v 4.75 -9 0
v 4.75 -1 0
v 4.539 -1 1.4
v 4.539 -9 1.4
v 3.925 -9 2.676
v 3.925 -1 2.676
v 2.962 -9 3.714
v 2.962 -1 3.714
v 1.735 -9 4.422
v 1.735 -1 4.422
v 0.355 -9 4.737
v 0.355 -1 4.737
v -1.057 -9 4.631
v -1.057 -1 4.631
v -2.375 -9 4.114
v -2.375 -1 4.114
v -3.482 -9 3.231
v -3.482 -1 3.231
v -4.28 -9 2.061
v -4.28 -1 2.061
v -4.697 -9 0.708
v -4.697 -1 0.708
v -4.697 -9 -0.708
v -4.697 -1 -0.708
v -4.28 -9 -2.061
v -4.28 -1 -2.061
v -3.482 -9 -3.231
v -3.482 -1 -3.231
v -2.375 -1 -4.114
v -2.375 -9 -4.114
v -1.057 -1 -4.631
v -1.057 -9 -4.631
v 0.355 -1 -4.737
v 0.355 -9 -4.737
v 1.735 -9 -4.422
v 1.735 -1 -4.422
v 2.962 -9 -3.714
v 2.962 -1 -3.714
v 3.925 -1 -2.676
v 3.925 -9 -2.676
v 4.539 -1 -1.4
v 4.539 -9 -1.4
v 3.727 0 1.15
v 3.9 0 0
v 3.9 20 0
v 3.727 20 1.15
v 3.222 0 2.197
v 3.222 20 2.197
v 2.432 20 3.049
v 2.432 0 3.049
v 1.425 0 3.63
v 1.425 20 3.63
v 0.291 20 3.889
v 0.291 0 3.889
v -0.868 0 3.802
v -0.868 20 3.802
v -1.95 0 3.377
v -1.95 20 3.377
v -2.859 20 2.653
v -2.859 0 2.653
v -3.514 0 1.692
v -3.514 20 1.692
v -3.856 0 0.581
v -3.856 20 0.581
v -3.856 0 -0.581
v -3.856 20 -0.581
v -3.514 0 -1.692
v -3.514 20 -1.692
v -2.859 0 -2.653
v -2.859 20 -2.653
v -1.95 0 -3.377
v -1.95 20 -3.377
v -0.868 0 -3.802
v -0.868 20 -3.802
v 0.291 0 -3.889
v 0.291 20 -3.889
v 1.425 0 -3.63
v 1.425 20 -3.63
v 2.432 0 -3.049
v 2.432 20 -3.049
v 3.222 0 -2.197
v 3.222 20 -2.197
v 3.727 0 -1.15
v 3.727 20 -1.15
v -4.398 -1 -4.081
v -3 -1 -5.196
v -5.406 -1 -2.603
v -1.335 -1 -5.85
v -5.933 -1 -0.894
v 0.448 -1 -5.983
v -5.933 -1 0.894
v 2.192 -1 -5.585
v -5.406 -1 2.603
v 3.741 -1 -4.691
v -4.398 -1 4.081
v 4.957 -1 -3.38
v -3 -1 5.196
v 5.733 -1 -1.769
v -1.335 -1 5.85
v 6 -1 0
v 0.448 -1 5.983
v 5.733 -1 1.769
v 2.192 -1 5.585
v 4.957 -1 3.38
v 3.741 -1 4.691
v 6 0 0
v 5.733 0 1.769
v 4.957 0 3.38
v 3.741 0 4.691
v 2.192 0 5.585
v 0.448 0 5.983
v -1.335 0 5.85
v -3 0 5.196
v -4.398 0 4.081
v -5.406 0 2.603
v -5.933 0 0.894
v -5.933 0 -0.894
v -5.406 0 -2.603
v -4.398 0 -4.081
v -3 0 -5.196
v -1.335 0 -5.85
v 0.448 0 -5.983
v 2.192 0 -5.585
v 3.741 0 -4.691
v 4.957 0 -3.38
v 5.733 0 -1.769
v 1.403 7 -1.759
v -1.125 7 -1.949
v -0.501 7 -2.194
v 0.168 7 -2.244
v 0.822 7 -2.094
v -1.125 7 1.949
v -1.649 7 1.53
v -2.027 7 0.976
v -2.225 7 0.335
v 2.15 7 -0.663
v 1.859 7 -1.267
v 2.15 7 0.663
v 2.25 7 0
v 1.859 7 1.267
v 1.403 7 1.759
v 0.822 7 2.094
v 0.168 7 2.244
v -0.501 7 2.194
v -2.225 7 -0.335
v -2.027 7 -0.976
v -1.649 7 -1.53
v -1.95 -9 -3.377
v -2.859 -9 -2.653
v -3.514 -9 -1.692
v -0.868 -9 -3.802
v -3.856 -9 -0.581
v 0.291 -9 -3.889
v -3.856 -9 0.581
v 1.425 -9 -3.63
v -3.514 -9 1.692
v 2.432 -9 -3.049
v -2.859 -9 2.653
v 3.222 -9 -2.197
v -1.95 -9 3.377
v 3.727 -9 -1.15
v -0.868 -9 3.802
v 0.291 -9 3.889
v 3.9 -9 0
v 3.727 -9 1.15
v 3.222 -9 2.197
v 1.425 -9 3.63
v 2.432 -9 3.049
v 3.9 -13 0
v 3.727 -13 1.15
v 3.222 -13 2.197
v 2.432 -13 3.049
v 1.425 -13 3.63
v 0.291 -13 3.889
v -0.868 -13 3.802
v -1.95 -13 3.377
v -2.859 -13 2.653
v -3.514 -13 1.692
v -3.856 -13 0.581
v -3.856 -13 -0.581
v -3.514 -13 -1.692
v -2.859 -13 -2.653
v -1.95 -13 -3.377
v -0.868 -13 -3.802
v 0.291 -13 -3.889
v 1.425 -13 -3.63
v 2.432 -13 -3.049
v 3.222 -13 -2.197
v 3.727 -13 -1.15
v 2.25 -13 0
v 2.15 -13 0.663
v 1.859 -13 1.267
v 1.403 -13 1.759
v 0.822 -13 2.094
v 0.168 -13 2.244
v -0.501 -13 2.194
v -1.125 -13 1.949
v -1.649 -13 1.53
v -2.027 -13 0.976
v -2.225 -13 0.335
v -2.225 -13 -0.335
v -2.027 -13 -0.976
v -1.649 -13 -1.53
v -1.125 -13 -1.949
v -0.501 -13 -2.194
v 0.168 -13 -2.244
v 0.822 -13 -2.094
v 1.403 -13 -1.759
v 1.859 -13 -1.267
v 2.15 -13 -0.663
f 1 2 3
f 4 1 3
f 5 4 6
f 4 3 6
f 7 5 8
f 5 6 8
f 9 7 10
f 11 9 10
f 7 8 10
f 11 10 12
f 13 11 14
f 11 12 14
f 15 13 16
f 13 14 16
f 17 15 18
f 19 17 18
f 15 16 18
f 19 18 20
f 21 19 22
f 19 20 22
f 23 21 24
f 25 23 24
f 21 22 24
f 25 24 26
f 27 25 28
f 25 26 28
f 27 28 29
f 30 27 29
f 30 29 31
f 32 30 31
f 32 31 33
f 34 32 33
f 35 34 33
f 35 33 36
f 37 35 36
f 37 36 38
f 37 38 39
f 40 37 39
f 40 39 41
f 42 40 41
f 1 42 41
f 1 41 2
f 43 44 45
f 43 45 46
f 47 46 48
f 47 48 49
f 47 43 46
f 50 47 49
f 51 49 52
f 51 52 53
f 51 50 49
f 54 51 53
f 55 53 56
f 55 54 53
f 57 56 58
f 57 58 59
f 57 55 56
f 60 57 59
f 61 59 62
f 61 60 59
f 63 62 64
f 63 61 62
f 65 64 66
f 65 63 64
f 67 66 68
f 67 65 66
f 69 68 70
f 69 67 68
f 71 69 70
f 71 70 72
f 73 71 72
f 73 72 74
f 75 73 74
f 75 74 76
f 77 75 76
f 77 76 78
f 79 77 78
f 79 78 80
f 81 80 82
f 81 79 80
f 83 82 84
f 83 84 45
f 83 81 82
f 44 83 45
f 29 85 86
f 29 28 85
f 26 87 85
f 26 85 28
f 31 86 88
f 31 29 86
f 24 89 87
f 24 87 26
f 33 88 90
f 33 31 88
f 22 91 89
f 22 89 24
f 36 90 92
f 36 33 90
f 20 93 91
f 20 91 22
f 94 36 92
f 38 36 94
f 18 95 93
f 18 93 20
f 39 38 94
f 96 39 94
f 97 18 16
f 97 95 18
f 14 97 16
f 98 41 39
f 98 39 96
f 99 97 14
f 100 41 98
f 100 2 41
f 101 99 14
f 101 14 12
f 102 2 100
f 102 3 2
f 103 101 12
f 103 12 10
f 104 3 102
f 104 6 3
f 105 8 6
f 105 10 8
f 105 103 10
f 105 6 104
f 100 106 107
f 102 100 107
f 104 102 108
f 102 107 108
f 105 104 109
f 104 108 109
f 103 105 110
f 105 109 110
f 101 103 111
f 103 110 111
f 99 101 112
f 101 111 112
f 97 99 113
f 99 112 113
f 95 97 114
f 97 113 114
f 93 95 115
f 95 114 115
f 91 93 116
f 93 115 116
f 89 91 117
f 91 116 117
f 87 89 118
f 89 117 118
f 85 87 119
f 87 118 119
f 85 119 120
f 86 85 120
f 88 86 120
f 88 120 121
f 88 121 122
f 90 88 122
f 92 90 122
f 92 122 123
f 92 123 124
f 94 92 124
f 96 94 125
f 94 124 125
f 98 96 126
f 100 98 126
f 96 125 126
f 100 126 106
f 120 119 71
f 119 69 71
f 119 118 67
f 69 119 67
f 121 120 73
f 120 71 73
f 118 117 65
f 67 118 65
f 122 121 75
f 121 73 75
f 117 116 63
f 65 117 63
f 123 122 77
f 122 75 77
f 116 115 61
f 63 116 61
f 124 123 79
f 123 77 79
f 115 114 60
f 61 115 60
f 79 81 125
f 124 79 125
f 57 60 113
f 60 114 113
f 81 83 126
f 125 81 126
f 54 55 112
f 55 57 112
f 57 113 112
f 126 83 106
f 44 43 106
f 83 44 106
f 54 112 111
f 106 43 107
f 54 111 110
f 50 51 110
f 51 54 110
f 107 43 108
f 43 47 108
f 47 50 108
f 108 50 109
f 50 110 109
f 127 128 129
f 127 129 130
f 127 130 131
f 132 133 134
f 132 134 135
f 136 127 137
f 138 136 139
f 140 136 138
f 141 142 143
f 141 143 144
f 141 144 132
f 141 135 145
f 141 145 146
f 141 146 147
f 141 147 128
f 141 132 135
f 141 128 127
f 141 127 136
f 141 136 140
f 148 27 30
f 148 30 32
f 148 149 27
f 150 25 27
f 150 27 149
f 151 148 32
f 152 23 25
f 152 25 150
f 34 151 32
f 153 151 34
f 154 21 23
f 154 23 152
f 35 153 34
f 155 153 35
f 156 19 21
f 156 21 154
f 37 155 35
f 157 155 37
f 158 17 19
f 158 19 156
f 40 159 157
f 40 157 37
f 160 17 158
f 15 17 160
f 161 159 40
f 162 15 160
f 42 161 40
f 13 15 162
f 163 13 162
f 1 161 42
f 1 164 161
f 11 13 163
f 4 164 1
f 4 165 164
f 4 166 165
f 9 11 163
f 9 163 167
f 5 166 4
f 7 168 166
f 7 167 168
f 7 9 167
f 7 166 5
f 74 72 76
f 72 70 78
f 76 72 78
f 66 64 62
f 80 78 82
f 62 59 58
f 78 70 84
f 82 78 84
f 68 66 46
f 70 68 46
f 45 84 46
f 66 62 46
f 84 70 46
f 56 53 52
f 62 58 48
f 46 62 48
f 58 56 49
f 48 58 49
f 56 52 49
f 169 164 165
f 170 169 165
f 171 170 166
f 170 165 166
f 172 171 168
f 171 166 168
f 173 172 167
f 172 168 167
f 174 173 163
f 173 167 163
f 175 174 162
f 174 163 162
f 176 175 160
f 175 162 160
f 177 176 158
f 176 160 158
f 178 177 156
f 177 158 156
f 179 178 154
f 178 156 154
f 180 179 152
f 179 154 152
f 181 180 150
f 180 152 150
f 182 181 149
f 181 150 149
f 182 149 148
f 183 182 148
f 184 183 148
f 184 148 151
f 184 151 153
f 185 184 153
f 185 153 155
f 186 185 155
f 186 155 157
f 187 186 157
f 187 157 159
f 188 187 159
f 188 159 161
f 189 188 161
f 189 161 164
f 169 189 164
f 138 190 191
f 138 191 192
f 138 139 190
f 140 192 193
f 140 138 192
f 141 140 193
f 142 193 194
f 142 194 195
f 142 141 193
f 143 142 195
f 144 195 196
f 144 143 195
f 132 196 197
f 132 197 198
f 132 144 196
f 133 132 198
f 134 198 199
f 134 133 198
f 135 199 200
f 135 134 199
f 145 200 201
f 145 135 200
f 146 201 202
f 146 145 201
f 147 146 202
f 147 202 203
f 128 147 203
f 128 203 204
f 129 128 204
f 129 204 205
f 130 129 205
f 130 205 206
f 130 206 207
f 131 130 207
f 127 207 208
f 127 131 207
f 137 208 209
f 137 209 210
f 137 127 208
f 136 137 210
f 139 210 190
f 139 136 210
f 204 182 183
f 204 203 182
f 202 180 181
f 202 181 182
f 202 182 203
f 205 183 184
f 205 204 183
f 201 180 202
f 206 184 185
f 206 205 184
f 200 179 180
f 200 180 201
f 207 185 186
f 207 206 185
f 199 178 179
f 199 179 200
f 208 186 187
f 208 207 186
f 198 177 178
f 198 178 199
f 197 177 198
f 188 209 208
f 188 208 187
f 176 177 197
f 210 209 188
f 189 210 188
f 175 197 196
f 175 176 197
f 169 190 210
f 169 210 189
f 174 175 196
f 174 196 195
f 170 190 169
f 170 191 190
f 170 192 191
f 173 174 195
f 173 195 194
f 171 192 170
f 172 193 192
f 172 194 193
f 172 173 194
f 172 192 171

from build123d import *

# Parameters (mm, degrees)
F0_R     = 3.9
F0_R_2   = 2.25
F1_DEPTH = 13
F0_R_3   = 4.75
F3_DEPTH = 9
F0_R_4   = 6
F4_DEPTH = 1
F5_DEPTH = 20
F6_DEPTH = 7


with BuildPart() as f1:
    # F0 (on Front) → F1 (new body)
    with BuildSketch(Plane.XZ):
        Circle(F0_R)
        Circle(F0_R_2, mode=Mode.SUBTRACT)
    extrude(amount=F1_DEPTH)

    # F0 (on Front) → F3 (join)
    with BuildSketch(Plane.XZ):
        Circle(F0_R_3)
        Circle(F0_R, mode=Mode.SUBTRACT)
    extrude(amount=F3_DEPTH)

    # F0 (on Front) → F4 (join)
    with BuildSketch(Plane.XZ):
        Circle(F0_R_4)
        Circle(F0_R_3, mode=Mode.SUBTRACT)
    extrude(amount=F4_DEPTH)

    # F0 (on Front) → F5 (join)
    with BuildSketch(Plane.XZ):
        Circle(F0_R)
        Circle(F0_R_2, mode=Mode.SUBTRACT)
        Circle(F0_R_2)
    extrude(amount=-F5_DEPTH)

    # F0 (on Front) → F6 (cut)
    with BuildSketch(Plane.XZ):
        Circle(F0_R_2)
    extrude(amount=-F6_DEPTH, mode=Mode.SUBTRACT)


solid = f1.part
